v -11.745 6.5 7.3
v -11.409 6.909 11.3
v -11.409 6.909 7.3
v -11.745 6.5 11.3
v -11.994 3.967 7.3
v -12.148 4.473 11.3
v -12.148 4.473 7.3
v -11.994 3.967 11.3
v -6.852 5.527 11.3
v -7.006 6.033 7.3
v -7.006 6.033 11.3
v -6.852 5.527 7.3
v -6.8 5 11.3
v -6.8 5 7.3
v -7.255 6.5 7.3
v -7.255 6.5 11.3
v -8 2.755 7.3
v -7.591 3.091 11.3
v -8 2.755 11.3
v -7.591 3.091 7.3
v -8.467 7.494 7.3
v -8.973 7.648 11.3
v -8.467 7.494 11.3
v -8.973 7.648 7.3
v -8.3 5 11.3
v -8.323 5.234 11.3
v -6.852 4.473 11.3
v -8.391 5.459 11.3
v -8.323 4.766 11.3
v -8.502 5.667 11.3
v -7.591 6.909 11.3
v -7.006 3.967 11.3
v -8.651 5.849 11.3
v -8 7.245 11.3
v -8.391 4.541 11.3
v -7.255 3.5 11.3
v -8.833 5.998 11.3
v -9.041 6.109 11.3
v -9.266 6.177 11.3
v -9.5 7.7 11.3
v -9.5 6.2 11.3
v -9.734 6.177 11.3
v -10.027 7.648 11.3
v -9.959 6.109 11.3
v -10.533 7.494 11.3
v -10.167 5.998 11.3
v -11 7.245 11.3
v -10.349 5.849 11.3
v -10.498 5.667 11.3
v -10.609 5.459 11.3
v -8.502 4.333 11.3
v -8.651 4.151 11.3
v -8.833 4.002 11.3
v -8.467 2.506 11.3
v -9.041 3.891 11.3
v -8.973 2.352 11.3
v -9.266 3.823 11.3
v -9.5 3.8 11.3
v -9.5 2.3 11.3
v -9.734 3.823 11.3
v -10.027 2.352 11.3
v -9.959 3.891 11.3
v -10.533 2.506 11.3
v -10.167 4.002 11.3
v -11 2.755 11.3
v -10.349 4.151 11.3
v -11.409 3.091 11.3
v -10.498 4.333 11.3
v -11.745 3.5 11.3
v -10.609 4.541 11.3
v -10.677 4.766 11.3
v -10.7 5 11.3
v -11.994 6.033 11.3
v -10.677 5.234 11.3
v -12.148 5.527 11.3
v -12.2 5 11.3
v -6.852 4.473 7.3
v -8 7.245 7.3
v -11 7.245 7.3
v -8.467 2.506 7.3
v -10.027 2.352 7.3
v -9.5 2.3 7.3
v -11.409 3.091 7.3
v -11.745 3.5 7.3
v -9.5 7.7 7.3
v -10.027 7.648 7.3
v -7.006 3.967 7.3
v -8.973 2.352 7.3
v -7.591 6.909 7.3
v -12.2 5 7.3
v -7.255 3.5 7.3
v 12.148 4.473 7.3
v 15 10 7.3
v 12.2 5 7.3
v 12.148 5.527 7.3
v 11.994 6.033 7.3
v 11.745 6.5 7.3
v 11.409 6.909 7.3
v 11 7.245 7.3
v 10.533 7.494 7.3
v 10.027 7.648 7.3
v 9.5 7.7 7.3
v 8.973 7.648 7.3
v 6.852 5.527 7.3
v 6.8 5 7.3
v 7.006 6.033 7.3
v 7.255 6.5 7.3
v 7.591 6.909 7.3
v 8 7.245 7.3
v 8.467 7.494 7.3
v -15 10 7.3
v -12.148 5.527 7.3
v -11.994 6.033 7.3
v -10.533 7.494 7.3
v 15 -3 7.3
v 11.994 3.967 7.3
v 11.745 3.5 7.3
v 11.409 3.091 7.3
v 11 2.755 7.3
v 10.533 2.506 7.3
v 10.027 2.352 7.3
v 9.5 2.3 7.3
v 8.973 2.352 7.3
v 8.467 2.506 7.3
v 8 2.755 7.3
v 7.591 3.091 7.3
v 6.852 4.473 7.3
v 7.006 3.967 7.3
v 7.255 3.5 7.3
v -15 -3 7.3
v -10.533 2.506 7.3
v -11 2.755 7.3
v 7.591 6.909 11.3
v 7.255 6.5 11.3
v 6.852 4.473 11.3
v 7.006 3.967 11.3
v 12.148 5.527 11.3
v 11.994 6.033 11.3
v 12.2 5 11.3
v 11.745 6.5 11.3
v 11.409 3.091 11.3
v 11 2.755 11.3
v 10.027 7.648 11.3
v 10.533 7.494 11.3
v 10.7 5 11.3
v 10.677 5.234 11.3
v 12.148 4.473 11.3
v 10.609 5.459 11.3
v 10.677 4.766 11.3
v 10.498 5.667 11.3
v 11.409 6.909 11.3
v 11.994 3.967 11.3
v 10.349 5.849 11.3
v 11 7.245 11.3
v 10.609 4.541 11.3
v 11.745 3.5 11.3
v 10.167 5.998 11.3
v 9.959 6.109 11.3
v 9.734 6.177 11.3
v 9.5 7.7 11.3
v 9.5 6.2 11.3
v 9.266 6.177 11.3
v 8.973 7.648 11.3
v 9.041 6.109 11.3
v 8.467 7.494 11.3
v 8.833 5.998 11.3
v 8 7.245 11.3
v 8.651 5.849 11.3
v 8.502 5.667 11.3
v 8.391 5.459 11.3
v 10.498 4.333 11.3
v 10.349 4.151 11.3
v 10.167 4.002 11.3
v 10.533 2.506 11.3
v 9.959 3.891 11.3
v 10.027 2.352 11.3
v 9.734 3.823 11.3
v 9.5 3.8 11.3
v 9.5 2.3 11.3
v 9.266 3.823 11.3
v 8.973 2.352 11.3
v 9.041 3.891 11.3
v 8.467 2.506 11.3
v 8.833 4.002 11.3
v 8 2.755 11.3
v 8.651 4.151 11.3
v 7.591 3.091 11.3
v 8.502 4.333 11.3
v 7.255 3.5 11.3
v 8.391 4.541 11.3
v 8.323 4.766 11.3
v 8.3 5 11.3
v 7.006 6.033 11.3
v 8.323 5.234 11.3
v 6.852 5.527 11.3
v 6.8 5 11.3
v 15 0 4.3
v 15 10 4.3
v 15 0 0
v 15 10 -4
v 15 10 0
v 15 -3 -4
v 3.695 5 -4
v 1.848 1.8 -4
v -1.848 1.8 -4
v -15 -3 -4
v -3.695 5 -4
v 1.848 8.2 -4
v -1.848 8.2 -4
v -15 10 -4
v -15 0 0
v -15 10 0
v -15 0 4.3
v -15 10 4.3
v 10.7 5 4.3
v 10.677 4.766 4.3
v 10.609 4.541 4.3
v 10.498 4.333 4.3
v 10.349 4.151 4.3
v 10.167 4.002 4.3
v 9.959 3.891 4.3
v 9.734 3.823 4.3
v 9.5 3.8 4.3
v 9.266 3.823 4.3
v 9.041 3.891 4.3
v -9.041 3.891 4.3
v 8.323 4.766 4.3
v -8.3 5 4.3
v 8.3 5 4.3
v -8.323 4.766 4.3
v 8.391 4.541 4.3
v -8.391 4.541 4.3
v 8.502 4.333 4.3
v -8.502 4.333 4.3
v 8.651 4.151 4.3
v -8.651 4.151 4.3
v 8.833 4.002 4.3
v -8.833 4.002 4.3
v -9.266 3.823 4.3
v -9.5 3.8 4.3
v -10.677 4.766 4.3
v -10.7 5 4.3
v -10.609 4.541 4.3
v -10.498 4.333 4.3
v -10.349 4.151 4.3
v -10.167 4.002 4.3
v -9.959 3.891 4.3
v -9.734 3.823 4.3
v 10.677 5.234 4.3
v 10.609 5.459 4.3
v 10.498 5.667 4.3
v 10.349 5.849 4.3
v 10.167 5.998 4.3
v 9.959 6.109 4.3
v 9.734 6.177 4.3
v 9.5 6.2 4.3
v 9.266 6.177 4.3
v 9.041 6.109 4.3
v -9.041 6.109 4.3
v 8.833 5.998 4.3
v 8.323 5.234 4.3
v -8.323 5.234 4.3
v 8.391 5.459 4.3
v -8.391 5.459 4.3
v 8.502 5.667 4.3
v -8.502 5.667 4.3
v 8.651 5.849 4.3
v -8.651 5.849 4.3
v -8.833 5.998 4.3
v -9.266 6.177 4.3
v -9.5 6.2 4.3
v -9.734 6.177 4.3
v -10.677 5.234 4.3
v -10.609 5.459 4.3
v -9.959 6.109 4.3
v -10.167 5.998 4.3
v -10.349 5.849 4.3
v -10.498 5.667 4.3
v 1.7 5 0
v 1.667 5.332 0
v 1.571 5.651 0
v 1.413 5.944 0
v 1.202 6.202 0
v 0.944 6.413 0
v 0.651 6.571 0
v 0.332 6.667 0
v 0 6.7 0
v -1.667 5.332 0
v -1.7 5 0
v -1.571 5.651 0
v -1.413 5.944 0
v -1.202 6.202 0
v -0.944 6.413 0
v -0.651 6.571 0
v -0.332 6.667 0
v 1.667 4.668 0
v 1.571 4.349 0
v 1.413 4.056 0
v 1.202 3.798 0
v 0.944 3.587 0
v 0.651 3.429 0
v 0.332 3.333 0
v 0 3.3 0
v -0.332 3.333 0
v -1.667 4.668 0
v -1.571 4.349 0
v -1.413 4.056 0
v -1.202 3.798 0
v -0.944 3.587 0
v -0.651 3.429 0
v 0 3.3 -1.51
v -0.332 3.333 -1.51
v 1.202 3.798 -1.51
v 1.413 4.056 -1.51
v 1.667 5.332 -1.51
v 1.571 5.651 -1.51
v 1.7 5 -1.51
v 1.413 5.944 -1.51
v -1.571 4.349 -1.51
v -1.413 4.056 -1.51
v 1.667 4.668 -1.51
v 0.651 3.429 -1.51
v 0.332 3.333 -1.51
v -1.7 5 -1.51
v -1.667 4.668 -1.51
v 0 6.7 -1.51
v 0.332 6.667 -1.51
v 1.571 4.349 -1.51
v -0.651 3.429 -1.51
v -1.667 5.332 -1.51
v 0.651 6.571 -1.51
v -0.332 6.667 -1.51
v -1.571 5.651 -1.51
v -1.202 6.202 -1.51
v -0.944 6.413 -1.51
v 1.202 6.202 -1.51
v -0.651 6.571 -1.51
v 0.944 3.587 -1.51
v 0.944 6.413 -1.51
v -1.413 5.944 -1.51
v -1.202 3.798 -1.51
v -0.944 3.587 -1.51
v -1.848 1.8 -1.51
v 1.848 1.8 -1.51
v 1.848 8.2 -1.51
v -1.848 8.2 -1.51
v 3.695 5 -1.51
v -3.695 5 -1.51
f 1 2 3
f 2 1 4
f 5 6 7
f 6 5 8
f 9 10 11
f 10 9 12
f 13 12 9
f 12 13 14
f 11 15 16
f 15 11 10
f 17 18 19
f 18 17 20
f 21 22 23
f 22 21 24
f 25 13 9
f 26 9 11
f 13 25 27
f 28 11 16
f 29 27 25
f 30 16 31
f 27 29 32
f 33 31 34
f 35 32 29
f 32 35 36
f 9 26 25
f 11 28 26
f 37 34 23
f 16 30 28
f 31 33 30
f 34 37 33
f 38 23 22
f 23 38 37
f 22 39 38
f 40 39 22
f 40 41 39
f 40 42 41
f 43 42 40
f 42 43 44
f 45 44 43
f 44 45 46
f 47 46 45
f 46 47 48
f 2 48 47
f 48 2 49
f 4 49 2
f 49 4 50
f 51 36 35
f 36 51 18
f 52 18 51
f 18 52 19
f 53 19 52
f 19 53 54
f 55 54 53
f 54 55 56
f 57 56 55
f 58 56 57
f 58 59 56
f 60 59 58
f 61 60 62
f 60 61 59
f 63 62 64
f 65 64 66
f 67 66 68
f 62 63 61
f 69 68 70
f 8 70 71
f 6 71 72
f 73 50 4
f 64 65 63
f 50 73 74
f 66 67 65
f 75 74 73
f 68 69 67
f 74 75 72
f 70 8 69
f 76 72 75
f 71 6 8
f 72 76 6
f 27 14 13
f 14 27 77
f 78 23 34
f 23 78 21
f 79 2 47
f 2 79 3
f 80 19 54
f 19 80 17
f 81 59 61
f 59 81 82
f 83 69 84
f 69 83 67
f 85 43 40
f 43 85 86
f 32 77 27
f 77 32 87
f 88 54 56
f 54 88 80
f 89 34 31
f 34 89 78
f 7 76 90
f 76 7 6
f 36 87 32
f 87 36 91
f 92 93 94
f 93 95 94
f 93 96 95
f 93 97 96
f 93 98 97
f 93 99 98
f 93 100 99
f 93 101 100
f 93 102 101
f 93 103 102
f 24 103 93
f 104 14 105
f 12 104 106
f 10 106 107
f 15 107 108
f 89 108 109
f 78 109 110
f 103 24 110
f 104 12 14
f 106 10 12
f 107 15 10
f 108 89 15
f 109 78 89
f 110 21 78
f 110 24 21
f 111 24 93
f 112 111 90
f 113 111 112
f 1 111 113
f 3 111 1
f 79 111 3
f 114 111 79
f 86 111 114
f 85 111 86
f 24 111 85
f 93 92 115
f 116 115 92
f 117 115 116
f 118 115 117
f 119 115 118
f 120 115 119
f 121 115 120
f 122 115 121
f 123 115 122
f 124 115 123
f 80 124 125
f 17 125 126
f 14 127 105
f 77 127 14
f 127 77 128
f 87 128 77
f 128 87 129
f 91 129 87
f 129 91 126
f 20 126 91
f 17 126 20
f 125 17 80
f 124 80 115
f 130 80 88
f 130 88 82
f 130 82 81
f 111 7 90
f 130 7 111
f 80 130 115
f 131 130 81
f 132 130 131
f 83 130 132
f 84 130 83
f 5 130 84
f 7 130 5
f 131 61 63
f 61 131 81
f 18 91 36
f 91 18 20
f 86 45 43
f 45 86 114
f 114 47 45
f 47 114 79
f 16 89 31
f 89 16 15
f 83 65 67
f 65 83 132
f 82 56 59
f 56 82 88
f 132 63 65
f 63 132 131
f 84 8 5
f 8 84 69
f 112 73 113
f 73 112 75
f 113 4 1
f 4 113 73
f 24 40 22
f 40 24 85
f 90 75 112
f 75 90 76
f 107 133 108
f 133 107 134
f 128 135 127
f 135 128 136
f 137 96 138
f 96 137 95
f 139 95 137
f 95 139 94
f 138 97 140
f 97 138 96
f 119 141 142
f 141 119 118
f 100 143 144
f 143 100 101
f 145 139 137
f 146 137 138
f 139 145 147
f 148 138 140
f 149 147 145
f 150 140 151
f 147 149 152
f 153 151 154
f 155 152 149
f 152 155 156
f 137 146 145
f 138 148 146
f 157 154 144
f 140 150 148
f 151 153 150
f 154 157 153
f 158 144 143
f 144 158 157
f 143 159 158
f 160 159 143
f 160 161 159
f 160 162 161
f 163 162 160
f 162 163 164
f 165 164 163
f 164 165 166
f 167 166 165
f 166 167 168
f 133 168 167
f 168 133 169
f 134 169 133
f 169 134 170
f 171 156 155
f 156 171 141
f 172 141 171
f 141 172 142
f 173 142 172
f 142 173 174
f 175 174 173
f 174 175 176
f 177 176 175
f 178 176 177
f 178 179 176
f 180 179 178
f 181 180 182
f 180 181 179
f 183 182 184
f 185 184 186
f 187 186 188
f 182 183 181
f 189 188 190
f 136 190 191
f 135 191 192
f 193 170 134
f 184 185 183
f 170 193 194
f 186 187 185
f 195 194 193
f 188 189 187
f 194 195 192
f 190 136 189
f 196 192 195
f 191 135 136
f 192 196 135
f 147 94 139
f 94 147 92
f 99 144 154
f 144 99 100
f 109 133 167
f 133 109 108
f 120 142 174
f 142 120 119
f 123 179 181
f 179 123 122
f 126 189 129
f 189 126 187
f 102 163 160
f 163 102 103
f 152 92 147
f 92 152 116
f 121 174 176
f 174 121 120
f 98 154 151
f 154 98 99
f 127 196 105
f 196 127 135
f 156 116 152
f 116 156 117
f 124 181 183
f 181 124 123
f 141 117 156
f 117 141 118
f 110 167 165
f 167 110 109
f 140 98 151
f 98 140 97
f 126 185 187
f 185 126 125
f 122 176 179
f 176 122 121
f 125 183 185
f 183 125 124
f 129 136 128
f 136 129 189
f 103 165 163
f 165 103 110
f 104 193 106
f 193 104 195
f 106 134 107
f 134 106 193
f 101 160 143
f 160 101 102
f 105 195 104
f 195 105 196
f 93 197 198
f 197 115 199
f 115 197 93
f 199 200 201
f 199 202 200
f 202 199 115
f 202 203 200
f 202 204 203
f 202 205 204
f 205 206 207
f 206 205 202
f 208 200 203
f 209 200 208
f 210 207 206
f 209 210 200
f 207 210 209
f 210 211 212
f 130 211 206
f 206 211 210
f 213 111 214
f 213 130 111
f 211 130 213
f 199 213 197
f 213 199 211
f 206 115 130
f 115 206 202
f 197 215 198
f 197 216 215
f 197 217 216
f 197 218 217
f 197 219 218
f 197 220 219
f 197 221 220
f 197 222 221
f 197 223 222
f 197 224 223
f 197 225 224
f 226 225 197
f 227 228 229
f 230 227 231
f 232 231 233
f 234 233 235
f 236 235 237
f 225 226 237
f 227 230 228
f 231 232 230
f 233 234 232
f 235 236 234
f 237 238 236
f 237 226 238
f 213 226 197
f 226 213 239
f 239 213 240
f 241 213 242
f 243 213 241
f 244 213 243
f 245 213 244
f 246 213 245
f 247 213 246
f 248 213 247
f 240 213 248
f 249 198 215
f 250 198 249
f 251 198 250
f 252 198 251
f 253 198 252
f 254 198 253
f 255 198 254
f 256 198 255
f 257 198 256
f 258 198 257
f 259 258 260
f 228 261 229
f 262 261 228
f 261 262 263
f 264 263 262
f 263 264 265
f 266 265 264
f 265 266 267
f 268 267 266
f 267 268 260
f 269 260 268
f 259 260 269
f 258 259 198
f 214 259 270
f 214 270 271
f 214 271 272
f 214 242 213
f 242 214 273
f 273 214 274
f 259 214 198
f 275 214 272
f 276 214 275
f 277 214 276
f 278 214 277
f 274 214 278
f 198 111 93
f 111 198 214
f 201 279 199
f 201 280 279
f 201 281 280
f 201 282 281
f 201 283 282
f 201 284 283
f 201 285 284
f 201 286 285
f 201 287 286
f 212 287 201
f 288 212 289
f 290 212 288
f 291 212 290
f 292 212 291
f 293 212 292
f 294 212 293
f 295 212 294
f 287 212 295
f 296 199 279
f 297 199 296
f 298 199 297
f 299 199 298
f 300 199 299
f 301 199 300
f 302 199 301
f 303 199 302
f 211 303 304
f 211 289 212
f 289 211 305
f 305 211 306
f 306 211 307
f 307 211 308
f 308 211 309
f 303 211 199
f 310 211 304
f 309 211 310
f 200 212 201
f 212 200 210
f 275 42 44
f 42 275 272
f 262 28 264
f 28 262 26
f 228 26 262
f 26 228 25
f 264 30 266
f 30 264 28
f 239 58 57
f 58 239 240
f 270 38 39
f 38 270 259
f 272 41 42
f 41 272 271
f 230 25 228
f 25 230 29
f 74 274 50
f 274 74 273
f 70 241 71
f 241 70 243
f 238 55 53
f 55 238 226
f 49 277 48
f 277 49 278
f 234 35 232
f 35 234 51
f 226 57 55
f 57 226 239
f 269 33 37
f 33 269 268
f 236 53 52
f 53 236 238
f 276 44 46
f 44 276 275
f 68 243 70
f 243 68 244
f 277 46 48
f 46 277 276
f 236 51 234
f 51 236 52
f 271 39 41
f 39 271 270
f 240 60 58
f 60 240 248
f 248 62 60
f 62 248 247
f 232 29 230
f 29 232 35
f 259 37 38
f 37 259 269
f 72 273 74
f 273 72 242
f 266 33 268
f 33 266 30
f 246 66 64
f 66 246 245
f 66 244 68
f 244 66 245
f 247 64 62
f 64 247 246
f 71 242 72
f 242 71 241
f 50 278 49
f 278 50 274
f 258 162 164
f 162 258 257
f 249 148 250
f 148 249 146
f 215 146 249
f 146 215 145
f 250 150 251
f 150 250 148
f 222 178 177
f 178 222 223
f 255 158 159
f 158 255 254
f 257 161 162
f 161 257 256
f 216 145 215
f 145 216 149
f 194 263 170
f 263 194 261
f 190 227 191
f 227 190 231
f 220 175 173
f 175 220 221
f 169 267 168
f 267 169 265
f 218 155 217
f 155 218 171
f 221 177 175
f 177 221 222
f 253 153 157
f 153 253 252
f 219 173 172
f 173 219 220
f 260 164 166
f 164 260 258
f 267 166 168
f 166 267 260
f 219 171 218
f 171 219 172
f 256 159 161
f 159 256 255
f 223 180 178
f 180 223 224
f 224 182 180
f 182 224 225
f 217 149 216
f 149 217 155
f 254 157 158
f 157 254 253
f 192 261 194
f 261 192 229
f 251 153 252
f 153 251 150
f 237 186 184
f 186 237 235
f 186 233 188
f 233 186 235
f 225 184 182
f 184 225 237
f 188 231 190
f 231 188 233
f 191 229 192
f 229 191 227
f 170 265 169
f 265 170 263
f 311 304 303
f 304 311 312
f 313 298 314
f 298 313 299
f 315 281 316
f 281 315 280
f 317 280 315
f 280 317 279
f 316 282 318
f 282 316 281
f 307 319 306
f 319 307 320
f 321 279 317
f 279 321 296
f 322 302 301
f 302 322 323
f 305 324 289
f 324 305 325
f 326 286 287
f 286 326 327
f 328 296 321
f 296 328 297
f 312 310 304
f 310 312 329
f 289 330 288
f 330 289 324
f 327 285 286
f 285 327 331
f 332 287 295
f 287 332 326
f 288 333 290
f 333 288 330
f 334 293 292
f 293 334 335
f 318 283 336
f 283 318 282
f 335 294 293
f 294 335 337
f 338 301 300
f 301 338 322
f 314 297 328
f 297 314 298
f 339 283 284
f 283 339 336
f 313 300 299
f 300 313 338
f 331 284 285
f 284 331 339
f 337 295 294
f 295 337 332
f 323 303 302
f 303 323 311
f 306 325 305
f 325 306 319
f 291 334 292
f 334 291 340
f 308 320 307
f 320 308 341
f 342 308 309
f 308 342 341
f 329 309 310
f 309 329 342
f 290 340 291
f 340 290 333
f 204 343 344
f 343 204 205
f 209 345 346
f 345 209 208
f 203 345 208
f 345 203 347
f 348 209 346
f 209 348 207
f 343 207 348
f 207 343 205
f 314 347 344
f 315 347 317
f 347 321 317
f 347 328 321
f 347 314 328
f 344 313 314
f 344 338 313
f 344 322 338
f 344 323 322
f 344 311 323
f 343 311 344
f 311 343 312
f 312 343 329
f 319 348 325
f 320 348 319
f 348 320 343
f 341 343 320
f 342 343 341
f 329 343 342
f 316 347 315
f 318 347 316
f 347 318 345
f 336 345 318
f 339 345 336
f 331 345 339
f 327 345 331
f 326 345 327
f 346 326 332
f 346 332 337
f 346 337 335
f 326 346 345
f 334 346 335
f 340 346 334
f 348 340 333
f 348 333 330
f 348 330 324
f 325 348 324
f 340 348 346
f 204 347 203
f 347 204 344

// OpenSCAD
// DP200 bed clamp for a USB accelerometer board (input shaping, Y axis).
// DRAFT: the plate dimensions are placeholders - measure and set them
// (docs/input_shaping.md, "Mounts").
//
// A C-clamp that grips the front edge of the bed plate, tightened by an M3
// screw from below (nut trapped in the lower jaw). The board screws on top.
// Y moves the whole bed, so any rigid point on the plate measures Y; the
// front edge is reachable without removing anything. Print upright (the
// C opening facing sideways) in PETG/PLA, 4 walls, 40 % infill.

/* [Bed plate - MEASURE] */
plate_thick     = 4;    // plate (+ build sheet) thickness at the front edge (mm)
grip_depth      = 10;   // how far the jaws reach over the plate (mm); keep
                        // clear of the print area and the levelling screws
under_clear     = 6;    // free space under the plate edge for the lower jaw (mm)

/* [Sensor board] */
board_holes     = [[-9.5, 0], [9.5, 0]];  // BTT ADXL345 V2.0 placeholders
hole_d          = 2.4;
standoff        = 4;

/* [Part] */
width           = 30;   // along the bed edge
jaw             = 3;    // jaw thickness
fit             = 0.3;
m3_d            = 3.4;
m3_nut          = 6.4;  // across flats + clearance

$fn = 32;
gap = plate_thick + fit;
lower = min(jaw + 1, under_clear);

difference() {
    union() {
        // back of the C (in front of the plate edge)
        translate([-width / 2, -jaw, -lower]) cube([width, jaw, lower + gap + jaw]);
        // upper jaw on top of the plate, carries the board
        translate([-width / 2, 0, gap]) cube([width, grip_depth, jaw]);
        // lower jaw under the plate, holds the clamp screw
        translate([-width / 2, 0, -lower]) cube([width, grip_depth, lower]);
        for (p = board_holes)
            translate([p[0], grip_depth / 2 + p[1], gap + jaw]) cylinder(d = hole_d + 3, h = standoff);
    }
    // clamp screw up through the lower jaw, nut trapped from below
    translate([0, grip_depth / 2, -lower - 1]) cylinder(d = m3_d, h = lower + 2);
    translate([0, grip_depth / 2, -lower - 0.01]) cylinder(d = m3_nut / cos(30), h = 2.5, $fn = 6);
    for (p = board_holes)
        translate([p[0], grip_depth / 2 + p[1], gap]) cylinder(d = hole_d, h = jaw + standoff + 1);
}
